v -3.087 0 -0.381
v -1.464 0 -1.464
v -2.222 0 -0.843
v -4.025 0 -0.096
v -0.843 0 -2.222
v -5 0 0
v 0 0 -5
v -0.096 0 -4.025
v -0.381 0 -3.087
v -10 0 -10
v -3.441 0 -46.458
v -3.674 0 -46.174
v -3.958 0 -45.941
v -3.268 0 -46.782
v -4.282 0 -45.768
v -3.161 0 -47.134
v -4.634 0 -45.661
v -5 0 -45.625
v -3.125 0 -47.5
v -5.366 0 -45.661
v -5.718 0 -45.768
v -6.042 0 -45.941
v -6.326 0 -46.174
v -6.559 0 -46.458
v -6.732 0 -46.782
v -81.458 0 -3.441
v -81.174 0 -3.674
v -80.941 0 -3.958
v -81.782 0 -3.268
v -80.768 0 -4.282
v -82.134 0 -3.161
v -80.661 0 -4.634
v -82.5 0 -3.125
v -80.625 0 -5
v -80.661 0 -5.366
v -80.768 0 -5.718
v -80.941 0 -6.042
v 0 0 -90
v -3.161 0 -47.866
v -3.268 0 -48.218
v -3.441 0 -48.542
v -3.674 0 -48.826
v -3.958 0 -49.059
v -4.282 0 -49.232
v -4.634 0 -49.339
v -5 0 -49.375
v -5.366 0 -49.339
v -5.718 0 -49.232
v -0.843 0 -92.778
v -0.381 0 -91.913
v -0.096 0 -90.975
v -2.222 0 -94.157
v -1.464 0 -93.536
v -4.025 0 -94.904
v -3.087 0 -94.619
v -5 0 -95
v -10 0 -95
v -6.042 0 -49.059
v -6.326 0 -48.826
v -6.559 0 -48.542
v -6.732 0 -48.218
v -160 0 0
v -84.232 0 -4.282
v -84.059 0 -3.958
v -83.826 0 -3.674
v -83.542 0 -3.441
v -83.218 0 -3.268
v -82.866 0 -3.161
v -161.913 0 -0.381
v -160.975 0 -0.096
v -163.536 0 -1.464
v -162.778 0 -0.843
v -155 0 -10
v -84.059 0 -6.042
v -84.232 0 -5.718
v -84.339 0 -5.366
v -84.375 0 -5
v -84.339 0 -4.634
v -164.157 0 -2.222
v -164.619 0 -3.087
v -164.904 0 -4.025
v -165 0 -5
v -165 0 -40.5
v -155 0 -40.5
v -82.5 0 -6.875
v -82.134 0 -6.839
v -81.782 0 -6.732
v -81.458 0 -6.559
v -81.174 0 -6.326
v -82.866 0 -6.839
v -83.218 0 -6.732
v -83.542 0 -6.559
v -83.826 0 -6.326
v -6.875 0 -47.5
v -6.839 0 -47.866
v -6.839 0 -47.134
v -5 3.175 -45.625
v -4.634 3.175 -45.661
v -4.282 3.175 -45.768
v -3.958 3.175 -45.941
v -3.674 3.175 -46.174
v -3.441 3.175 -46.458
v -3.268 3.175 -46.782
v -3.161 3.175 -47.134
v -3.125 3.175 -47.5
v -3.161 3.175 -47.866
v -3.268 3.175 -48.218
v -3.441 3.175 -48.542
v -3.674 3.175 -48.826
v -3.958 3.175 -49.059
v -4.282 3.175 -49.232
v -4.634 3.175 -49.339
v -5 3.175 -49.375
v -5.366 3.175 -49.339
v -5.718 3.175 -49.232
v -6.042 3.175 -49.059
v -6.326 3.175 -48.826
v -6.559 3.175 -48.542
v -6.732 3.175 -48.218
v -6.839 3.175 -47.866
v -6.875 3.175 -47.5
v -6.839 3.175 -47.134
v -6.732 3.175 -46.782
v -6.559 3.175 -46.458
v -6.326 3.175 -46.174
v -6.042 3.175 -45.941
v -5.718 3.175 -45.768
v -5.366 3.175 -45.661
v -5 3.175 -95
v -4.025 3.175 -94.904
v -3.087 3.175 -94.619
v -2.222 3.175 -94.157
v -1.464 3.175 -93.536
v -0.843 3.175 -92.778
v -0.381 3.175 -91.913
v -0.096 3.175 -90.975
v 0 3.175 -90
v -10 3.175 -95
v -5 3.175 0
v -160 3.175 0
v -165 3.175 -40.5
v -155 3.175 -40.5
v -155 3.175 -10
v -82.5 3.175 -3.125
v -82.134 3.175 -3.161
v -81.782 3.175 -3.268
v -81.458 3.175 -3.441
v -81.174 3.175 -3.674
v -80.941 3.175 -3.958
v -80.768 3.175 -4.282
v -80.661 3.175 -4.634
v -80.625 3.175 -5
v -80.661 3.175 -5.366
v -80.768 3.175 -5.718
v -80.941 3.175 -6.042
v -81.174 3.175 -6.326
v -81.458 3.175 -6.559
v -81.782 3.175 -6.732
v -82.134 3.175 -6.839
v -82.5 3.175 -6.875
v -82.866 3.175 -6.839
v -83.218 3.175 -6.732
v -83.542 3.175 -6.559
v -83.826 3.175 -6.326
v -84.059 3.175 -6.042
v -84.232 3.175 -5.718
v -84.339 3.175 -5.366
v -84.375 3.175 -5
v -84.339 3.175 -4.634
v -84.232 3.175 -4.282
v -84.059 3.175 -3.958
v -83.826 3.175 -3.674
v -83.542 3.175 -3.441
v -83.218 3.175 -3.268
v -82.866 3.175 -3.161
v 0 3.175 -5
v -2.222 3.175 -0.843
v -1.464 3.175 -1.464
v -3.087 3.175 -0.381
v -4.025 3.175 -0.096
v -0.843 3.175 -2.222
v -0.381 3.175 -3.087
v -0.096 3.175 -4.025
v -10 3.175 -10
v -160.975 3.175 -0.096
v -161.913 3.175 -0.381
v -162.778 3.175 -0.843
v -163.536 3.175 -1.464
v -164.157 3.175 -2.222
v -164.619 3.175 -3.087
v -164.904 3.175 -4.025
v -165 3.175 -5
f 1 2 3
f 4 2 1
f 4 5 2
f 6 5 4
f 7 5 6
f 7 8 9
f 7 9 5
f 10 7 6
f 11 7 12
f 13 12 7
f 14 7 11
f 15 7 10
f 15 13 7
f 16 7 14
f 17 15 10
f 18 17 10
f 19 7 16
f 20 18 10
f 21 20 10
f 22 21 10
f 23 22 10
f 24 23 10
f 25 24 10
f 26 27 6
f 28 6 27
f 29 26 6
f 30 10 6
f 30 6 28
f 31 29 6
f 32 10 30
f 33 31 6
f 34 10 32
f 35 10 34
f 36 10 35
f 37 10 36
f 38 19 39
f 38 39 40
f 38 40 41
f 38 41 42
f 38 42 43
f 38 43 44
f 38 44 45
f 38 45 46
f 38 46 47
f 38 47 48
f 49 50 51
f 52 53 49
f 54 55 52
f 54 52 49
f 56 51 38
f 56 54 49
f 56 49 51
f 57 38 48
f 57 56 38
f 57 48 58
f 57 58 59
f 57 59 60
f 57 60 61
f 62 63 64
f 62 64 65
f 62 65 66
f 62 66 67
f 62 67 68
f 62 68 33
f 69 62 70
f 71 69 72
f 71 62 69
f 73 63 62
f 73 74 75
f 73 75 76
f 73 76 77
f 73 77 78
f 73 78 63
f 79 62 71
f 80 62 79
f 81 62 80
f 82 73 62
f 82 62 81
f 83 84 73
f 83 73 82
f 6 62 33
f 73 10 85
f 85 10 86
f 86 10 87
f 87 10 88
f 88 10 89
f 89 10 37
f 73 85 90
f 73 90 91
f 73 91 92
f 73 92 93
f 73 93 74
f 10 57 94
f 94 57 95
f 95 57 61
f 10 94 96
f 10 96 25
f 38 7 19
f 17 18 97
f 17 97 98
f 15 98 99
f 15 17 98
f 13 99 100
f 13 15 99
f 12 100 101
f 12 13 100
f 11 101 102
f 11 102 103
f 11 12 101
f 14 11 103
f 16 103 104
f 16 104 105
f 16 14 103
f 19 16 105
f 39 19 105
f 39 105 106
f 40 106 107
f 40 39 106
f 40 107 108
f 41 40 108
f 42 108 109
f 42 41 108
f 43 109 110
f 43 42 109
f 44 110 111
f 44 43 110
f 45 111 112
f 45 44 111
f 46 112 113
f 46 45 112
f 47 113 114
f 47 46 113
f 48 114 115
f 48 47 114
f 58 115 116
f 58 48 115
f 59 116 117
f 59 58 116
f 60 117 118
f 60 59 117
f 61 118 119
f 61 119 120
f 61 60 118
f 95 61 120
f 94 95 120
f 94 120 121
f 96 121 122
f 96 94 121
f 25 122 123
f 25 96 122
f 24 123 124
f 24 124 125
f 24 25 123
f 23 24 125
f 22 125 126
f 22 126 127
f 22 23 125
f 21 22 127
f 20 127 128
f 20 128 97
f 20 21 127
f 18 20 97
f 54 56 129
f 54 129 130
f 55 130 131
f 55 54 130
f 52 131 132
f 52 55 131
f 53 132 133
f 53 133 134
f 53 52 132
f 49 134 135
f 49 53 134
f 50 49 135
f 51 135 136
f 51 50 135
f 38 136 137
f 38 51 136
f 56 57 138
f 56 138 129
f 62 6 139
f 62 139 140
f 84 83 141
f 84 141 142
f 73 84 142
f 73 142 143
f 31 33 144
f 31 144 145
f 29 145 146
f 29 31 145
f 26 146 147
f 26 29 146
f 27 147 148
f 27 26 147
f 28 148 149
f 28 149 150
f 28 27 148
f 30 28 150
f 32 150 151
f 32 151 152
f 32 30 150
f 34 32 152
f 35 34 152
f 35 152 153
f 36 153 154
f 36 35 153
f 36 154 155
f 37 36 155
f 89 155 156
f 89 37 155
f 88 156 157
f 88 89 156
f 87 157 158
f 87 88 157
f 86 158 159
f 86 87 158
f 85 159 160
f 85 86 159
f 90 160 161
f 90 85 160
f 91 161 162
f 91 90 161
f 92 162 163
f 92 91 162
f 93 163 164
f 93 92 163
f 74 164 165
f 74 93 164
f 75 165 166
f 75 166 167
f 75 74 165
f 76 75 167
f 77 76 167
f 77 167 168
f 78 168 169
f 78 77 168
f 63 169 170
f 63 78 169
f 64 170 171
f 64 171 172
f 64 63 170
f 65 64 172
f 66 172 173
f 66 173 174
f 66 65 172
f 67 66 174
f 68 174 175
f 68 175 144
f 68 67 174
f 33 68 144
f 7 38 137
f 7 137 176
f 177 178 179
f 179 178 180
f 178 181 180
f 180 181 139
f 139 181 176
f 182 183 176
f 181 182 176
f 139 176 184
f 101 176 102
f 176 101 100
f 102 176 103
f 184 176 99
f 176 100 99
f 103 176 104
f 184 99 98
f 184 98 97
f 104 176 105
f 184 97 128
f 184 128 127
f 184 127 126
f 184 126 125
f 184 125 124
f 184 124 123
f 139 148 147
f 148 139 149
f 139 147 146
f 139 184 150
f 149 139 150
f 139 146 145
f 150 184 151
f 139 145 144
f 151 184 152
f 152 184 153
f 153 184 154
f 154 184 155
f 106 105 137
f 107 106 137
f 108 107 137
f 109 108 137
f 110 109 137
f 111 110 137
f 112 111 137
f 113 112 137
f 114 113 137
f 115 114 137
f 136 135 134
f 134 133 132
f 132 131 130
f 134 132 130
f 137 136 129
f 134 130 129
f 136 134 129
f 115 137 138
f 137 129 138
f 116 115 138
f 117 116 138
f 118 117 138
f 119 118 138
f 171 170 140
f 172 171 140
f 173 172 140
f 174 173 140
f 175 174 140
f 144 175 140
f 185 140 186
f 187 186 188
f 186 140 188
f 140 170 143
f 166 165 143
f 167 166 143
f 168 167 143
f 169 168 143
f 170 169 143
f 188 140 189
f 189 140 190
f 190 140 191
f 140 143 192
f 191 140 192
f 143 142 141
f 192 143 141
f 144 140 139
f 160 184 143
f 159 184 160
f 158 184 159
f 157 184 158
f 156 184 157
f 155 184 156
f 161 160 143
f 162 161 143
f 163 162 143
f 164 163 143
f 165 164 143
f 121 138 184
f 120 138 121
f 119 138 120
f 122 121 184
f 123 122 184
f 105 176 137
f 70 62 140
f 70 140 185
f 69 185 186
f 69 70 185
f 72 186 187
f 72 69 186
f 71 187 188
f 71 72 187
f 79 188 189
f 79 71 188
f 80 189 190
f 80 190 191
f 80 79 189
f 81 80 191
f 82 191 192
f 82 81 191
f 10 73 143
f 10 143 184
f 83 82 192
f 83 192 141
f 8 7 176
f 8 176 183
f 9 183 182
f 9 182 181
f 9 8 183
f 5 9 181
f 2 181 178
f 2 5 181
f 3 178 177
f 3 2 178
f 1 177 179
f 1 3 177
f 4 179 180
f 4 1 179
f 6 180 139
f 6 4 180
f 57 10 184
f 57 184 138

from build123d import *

# Parameters (mm, degrees)
SKETCH1_R           = 1.875
BOSS_EXTRUDE1_DEPTH = 3.175


with BuildPart() as part:
    # Sketch1 → Boss-Extrude1 (new body)
    with BuildSketch(Plane(origin=(0, 0, 0), x_dir=(1, 0, 0), z_dir=(0, 1, 0))):
        with BuildLine():
            Line((-5, 0), (-160, 0))
            ThreePointArc((-160, 0), (-163.535533906, 1.464466094), (-165, 5))
            Line((-165, 5), (-165, 40.5))
            Line((-165, 40.5), (-155, 40.5))
            Line((-155, 40.5), (-155, 10))
            Line((-155, 10), (-10, 10))
            Line((-10, 10), (-10, 85))
            Line((-10, 85), (-10, 95))
            Line((-10, 95), (-5, 95))
            ThreePointArc((-5, 95), (-1.464466094, 93.535533906), (0, 90))
            Line((0, 90), (0, 5))
            ThreePointArc((0, 5), (-1.464466094, 1.464466094), (-5, 0))
        make_face()
        with Locations(Location((-5, 47.5, 0), (0, 0, 270))):
            Circle(SKETCH1_R, mode=Mode.SUBTRACT)
        with Locations(Location((-82.5, 5, 0), (0, 0, 270))):
            Circle(SKETCH1_R, mode=Mode.SUBTRACT)
    extrude(amount=BOSS_EXTRUDE1_DEPTH)


solid = part.part
